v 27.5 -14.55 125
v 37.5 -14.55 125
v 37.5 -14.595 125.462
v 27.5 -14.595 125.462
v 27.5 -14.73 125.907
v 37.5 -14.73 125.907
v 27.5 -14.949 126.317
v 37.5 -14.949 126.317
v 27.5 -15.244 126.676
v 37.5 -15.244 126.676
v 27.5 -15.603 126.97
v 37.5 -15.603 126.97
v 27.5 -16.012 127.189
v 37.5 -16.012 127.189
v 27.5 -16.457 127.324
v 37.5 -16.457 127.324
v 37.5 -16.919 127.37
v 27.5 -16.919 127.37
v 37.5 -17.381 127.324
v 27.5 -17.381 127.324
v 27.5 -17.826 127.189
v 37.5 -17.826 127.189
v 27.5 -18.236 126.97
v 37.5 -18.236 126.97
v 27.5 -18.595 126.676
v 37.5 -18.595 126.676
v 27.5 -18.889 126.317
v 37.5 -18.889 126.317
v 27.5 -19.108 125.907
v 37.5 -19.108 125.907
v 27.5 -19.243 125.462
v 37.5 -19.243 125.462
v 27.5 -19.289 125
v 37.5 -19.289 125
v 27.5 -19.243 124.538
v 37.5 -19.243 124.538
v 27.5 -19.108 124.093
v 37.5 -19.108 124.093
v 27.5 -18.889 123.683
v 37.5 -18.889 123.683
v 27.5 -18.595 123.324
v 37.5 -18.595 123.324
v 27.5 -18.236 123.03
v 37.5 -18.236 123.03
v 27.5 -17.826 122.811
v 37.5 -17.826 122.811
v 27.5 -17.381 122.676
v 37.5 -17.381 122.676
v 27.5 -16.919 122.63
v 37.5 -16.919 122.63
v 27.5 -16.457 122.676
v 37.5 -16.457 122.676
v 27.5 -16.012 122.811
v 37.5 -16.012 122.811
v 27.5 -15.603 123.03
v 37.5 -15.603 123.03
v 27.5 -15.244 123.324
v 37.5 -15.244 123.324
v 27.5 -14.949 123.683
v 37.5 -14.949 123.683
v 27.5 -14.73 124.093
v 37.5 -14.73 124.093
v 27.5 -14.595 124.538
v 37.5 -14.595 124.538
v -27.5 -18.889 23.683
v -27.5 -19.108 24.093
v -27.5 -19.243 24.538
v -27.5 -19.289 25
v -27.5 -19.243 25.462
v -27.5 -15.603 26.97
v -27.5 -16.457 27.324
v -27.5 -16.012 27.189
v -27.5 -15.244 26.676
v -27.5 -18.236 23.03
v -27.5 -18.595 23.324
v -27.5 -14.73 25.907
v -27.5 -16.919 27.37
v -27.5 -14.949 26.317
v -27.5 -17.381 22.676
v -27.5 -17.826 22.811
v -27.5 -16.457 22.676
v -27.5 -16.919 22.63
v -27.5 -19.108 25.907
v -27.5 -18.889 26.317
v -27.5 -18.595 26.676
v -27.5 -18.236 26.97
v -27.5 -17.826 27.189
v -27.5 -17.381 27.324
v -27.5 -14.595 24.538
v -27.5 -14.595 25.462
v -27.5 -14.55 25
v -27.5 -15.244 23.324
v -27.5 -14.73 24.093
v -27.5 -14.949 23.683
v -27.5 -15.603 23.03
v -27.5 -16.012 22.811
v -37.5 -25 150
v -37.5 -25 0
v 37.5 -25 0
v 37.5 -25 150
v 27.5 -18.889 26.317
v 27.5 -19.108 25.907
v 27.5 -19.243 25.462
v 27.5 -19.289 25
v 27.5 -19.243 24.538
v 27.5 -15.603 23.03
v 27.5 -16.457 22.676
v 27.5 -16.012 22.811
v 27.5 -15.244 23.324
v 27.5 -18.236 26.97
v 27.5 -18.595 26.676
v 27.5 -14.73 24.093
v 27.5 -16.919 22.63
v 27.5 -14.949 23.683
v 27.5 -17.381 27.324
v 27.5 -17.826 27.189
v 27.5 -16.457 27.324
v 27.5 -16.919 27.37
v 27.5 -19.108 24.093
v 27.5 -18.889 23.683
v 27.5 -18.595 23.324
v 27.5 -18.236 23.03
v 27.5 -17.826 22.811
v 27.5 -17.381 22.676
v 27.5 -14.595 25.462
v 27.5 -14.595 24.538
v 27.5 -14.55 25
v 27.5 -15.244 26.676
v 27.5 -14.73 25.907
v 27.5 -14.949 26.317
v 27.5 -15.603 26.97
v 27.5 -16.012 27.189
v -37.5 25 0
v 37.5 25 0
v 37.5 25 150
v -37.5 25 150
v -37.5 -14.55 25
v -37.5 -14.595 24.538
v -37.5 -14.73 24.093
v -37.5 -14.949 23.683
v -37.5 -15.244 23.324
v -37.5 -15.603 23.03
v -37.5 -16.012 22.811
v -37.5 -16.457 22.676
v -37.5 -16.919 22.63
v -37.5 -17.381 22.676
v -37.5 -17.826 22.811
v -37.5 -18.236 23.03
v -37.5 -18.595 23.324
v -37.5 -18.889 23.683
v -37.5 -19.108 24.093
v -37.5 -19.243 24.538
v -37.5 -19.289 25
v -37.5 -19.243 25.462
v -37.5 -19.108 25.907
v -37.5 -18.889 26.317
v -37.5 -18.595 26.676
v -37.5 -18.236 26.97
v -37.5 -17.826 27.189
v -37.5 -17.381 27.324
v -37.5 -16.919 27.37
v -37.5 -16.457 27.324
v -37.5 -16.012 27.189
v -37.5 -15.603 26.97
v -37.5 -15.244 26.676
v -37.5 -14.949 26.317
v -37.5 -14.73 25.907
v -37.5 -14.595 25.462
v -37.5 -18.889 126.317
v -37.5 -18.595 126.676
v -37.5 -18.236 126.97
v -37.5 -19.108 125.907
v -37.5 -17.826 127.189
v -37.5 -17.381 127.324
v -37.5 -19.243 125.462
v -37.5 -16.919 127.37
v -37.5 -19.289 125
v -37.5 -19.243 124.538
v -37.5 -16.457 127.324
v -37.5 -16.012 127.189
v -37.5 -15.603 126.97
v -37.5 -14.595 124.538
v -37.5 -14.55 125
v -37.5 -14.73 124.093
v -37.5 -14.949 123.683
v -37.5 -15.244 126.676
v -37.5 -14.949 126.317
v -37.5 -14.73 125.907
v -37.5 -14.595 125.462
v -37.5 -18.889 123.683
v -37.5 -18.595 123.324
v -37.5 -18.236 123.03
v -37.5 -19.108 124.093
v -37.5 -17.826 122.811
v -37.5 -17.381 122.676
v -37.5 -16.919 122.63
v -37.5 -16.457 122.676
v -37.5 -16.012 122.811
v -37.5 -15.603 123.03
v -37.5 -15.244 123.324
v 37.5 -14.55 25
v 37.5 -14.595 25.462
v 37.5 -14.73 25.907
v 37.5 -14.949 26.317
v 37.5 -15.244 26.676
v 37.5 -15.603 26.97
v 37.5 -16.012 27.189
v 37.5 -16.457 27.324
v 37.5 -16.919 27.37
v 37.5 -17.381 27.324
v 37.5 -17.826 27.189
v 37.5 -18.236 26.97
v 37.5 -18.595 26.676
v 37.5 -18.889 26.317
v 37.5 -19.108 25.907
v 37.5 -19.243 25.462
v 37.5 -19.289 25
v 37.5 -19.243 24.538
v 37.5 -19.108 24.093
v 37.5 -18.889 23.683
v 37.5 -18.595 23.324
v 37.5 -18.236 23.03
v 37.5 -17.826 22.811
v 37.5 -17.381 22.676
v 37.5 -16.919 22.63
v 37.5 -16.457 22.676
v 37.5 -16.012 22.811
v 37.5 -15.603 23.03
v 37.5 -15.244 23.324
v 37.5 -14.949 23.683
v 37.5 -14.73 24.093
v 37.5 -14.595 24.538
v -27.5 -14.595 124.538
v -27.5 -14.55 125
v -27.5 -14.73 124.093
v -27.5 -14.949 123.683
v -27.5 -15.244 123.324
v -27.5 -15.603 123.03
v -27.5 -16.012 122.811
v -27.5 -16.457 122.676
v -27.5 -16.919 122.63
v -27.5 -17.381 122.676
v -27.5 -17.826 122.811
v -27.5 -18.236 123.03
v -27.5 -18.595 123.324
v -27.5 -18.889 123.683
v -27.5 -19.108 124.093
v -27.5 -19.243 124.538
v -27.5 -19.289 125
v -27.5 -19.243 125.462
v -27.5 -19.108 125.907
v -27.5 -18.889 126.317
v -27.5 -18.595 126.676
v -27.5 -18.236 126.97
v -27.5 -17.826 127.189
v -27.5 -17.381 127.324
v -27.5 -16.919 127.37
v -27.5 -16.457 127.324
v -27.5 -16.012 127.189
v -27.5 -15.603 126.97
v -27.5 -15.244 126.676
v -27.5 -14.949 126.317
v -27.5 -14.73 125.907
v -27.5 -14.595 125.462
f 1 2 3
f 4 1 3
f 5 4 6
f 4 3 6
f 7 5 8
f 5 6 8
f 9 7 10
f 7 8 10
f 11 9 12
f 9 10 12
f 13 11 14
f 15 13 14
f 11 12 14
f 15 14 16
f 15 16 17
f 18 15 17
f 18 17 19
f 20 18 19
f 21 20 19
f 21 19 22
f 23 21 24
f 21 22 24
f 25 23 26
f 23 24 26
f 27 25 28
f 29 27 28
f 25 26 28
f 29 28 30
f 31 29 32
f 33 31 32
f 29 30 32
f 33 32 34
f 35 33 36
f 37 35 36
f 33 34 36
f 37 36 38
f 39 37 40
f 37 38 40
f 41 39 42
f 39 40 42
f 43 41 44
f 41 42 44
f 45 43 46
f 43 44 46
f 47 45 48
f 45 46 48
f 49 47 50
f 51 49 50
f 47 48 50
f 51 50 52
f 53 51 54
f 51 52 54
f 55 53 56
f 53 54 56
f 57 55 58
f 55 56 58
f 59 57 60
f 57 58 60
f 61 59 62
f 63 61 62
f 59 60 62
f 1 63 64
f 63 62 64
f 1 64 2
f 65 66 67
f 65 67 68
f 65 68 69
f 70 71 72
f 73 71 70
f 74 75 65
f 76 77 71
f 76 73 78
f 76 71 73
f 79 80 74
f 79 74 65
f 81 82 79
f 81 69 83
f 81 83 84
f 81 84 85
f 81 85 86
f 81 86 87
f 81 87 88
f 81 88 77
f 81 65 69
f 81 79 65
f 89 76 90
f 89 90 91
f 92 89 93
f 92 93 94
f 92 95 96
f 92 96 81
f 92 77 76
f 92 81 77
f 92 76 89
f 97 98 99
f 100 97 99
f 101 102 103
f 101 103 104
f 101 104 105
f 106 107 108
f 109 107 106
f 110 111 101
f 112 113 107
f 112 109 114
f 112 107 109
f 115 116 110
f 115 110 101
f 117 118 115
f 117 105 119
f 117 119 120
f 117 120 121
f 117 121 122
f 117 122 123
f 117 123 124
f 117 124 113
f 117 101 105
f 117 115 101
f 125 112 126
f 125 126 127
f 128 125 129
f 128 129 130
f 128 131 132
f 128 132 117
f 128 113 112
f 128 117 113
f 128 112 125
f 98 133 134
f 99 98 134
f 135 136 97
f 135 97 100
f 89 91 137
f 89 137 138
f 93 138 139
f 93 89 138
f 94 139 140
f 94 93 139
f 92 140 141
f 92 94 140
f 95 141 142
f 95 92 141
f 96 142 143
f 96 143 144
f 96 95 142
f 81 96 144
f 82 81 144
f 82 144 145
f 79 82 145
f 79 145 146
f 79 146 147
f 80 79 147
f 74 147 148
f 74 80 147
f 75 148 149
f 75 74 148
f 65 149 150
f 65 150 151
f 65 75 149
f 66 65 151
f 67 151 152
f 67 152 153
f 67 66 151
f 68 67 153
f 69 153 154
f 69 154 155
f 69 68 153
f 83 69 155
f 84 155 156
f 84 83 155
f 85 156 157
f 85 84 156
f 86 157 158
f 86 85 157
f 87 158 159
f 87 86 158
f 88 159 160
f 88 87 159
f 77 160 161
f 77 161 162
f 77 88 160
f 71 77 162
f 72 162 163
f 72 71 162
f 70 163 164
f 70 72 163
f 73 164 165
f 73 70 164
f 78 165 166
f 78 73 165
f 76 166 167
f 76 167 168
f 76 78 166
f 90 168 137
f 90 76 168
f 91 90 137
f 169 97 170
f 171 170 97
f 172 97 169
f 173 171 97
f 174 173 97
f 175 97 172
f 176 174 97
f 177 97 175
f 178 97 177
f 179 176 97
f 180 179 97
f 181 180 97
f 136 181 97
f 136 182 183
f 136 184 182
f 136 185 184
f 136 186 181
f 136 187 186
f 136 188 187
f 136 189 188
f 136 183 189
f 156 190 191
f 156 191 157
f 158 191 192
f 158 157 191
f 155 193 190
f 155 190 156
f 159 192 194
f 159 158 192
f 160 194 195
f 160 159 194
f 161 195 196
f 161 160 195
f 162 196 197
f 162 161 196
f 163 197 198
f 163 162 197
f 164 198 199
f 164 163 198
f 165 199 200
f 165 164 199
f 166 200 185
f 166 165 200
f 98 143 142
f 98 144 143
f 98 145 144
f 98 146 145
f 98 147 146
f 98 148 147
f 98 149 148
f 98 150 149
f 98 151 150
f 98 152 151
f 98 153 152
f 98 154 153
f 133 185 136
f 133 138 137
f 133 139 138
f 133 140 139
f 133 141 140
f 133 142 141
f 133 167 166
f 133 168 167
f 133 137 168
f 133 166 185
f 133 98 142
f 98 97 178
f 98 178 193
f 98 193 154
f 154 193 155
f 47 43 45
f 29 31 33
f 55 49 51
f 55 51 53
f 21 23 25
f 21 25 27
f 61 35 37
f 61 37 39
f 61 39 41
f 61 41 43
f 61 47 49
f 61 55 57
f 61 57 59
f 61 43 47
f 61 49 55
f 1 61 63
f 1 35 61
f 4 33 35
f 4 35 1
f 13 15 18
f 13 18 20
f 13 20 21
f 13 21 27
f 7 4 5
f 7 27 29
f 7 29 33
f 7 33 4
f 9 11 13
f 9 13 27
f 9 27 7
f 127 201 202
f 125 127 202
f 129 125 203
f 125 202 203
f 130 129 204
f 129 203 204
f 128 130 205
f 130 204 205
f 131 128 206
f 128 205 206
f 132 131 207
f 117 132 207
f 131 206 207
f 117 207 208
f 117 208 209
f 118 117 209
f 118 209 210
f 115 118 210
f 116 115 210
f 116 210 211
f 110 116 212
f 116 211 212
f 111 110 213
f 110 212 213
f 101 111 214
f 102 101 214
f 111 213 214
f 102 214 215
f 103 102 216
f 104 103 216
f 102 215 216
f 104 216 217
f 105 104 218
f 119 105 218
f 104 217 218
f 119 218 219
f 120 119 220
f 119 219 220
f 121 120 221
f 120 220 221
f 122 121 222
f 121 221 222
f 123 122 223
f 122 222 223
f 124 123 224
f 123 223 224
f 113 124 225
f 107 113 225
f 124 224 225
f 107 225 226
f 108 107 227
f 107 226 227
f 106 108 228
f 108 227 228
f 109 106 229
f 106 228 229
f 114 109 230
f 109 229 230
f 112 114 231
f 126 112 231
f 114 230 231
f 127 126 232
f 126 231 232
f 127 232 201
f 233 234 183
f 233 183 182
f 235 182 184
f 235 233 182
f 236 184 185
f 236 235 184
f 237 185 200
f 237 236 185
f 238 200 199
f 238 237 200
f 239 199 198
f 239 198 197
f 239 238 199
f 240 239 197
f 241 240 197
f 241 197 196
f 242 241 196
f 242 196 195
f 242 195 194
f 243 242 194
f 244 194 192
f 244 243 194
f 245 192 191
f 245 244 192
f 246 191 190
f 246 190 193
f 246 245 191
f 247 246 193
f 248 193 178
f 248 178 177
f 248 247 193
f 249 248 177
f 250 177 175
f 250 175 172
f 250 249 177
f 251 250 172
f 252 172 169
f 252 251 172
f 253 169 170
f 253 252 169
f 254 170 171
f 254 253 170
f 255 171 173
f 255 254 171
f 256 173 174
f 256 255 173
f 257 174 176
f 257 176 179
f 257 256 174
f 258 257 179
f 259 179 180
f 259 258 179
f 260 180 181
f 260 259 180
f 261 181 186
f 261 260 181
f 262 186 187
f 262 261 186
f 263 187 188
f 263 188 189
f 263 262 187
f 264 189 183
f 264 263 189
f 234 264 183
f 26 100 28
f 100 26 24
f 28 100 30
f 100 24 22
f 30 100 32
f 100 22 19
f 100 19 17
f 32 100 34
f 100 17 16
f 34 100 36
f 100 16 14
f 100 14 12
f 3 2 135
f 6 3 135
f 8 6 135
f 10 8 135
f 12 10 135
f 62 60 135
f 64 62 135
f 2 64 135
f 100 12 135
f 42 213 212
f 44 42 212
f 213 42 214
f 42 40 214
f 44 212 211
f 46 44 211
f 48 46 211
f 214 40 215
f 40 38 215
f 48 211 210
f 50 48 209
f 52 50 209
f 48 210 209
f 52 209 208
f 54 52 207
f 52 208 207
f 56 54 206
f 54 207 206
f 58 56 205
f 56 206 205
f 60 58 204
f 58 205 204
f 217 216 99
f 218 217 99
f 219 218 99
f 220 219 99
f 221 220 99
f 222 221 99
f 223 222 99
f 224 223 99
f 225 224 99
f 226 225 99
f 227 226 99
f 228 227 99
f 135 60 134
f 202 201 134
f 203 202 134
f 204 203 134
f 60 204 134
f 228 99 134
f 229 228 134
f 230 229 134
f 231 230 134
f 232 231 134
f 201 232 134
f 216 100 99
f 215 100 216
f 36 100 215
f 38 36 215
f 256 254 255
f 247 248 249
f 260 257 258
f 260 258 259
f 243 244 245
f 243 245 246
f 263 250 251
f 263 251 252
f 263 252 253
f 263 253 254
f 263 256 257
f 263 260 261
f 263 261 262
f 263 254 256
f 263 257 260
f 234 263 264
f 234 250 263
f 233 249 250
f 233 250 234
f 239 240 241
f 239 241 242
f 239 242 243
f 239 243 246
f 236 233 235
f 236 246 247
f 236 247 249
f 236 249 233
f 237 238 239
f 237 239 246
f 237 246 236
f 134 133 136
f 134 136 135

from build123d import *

# Parameters (mm, degrees)
SKETCH1_W           = 75
SKETCH1_H           = 50
BOSS_EXTRUDE1_DEPTH = 150
SKETCH2_R           = 2.369647205
CUT_EXTRUDE1_DEPTH  = 10
CUT_EXTRUDE2_START  = -10
SKETCH3_R           = 2.369647205
CUT_EXTRUDE2_DEPTH  = 10


with BuildPart() as part:
    # Sketch1 → Boss-Extrude1 (new body)
    with BuildSketch(Plane.XY):
        Rectangle(SKETCH1_W, SKETCH1_H)
    extrude(amount=BOSS_EXTRUDE1_DEPTH)

    # Sketch2 → Cut-Extrude1 (cut)
    with BuildSketch(Plane(origin=(37.5, 0, 0), x_dir=(0, 0, -1), z_dir=(1, 0, 0))):
        with Locations(Location((-125, -16.919154578, 0), (0, 0, 90))):
            Circle(SKETCH2_R)
        with Locations(Location((-25, -16.919154578, 0), (0, 0, 90))):
            Circle(SKETCH2_R)
    extrude(amount=-CUT_EXTRUDE1_DEPTH, mode=Mode.SUBTRACT)

    # Sketch3 → Cut-Extrude2 (cut)
    with BuildSketch(Plane.ZY.offset(37.5).offset(CUT_EXTRUDE2_START)):
        with Locations(Location((25, -16.919154578, 0), (0, 0, 90))):
            Circle(SKETCH3_R)
        with Locations(Location((125, -16.919154578, 0), (0, 0, 90))):
            Circle(SKETCH3_R)
    extrude(amount=CUT_EXTRUDE2_DEPTH, mode=Mode.SUBTRACT)


solid = part.part
